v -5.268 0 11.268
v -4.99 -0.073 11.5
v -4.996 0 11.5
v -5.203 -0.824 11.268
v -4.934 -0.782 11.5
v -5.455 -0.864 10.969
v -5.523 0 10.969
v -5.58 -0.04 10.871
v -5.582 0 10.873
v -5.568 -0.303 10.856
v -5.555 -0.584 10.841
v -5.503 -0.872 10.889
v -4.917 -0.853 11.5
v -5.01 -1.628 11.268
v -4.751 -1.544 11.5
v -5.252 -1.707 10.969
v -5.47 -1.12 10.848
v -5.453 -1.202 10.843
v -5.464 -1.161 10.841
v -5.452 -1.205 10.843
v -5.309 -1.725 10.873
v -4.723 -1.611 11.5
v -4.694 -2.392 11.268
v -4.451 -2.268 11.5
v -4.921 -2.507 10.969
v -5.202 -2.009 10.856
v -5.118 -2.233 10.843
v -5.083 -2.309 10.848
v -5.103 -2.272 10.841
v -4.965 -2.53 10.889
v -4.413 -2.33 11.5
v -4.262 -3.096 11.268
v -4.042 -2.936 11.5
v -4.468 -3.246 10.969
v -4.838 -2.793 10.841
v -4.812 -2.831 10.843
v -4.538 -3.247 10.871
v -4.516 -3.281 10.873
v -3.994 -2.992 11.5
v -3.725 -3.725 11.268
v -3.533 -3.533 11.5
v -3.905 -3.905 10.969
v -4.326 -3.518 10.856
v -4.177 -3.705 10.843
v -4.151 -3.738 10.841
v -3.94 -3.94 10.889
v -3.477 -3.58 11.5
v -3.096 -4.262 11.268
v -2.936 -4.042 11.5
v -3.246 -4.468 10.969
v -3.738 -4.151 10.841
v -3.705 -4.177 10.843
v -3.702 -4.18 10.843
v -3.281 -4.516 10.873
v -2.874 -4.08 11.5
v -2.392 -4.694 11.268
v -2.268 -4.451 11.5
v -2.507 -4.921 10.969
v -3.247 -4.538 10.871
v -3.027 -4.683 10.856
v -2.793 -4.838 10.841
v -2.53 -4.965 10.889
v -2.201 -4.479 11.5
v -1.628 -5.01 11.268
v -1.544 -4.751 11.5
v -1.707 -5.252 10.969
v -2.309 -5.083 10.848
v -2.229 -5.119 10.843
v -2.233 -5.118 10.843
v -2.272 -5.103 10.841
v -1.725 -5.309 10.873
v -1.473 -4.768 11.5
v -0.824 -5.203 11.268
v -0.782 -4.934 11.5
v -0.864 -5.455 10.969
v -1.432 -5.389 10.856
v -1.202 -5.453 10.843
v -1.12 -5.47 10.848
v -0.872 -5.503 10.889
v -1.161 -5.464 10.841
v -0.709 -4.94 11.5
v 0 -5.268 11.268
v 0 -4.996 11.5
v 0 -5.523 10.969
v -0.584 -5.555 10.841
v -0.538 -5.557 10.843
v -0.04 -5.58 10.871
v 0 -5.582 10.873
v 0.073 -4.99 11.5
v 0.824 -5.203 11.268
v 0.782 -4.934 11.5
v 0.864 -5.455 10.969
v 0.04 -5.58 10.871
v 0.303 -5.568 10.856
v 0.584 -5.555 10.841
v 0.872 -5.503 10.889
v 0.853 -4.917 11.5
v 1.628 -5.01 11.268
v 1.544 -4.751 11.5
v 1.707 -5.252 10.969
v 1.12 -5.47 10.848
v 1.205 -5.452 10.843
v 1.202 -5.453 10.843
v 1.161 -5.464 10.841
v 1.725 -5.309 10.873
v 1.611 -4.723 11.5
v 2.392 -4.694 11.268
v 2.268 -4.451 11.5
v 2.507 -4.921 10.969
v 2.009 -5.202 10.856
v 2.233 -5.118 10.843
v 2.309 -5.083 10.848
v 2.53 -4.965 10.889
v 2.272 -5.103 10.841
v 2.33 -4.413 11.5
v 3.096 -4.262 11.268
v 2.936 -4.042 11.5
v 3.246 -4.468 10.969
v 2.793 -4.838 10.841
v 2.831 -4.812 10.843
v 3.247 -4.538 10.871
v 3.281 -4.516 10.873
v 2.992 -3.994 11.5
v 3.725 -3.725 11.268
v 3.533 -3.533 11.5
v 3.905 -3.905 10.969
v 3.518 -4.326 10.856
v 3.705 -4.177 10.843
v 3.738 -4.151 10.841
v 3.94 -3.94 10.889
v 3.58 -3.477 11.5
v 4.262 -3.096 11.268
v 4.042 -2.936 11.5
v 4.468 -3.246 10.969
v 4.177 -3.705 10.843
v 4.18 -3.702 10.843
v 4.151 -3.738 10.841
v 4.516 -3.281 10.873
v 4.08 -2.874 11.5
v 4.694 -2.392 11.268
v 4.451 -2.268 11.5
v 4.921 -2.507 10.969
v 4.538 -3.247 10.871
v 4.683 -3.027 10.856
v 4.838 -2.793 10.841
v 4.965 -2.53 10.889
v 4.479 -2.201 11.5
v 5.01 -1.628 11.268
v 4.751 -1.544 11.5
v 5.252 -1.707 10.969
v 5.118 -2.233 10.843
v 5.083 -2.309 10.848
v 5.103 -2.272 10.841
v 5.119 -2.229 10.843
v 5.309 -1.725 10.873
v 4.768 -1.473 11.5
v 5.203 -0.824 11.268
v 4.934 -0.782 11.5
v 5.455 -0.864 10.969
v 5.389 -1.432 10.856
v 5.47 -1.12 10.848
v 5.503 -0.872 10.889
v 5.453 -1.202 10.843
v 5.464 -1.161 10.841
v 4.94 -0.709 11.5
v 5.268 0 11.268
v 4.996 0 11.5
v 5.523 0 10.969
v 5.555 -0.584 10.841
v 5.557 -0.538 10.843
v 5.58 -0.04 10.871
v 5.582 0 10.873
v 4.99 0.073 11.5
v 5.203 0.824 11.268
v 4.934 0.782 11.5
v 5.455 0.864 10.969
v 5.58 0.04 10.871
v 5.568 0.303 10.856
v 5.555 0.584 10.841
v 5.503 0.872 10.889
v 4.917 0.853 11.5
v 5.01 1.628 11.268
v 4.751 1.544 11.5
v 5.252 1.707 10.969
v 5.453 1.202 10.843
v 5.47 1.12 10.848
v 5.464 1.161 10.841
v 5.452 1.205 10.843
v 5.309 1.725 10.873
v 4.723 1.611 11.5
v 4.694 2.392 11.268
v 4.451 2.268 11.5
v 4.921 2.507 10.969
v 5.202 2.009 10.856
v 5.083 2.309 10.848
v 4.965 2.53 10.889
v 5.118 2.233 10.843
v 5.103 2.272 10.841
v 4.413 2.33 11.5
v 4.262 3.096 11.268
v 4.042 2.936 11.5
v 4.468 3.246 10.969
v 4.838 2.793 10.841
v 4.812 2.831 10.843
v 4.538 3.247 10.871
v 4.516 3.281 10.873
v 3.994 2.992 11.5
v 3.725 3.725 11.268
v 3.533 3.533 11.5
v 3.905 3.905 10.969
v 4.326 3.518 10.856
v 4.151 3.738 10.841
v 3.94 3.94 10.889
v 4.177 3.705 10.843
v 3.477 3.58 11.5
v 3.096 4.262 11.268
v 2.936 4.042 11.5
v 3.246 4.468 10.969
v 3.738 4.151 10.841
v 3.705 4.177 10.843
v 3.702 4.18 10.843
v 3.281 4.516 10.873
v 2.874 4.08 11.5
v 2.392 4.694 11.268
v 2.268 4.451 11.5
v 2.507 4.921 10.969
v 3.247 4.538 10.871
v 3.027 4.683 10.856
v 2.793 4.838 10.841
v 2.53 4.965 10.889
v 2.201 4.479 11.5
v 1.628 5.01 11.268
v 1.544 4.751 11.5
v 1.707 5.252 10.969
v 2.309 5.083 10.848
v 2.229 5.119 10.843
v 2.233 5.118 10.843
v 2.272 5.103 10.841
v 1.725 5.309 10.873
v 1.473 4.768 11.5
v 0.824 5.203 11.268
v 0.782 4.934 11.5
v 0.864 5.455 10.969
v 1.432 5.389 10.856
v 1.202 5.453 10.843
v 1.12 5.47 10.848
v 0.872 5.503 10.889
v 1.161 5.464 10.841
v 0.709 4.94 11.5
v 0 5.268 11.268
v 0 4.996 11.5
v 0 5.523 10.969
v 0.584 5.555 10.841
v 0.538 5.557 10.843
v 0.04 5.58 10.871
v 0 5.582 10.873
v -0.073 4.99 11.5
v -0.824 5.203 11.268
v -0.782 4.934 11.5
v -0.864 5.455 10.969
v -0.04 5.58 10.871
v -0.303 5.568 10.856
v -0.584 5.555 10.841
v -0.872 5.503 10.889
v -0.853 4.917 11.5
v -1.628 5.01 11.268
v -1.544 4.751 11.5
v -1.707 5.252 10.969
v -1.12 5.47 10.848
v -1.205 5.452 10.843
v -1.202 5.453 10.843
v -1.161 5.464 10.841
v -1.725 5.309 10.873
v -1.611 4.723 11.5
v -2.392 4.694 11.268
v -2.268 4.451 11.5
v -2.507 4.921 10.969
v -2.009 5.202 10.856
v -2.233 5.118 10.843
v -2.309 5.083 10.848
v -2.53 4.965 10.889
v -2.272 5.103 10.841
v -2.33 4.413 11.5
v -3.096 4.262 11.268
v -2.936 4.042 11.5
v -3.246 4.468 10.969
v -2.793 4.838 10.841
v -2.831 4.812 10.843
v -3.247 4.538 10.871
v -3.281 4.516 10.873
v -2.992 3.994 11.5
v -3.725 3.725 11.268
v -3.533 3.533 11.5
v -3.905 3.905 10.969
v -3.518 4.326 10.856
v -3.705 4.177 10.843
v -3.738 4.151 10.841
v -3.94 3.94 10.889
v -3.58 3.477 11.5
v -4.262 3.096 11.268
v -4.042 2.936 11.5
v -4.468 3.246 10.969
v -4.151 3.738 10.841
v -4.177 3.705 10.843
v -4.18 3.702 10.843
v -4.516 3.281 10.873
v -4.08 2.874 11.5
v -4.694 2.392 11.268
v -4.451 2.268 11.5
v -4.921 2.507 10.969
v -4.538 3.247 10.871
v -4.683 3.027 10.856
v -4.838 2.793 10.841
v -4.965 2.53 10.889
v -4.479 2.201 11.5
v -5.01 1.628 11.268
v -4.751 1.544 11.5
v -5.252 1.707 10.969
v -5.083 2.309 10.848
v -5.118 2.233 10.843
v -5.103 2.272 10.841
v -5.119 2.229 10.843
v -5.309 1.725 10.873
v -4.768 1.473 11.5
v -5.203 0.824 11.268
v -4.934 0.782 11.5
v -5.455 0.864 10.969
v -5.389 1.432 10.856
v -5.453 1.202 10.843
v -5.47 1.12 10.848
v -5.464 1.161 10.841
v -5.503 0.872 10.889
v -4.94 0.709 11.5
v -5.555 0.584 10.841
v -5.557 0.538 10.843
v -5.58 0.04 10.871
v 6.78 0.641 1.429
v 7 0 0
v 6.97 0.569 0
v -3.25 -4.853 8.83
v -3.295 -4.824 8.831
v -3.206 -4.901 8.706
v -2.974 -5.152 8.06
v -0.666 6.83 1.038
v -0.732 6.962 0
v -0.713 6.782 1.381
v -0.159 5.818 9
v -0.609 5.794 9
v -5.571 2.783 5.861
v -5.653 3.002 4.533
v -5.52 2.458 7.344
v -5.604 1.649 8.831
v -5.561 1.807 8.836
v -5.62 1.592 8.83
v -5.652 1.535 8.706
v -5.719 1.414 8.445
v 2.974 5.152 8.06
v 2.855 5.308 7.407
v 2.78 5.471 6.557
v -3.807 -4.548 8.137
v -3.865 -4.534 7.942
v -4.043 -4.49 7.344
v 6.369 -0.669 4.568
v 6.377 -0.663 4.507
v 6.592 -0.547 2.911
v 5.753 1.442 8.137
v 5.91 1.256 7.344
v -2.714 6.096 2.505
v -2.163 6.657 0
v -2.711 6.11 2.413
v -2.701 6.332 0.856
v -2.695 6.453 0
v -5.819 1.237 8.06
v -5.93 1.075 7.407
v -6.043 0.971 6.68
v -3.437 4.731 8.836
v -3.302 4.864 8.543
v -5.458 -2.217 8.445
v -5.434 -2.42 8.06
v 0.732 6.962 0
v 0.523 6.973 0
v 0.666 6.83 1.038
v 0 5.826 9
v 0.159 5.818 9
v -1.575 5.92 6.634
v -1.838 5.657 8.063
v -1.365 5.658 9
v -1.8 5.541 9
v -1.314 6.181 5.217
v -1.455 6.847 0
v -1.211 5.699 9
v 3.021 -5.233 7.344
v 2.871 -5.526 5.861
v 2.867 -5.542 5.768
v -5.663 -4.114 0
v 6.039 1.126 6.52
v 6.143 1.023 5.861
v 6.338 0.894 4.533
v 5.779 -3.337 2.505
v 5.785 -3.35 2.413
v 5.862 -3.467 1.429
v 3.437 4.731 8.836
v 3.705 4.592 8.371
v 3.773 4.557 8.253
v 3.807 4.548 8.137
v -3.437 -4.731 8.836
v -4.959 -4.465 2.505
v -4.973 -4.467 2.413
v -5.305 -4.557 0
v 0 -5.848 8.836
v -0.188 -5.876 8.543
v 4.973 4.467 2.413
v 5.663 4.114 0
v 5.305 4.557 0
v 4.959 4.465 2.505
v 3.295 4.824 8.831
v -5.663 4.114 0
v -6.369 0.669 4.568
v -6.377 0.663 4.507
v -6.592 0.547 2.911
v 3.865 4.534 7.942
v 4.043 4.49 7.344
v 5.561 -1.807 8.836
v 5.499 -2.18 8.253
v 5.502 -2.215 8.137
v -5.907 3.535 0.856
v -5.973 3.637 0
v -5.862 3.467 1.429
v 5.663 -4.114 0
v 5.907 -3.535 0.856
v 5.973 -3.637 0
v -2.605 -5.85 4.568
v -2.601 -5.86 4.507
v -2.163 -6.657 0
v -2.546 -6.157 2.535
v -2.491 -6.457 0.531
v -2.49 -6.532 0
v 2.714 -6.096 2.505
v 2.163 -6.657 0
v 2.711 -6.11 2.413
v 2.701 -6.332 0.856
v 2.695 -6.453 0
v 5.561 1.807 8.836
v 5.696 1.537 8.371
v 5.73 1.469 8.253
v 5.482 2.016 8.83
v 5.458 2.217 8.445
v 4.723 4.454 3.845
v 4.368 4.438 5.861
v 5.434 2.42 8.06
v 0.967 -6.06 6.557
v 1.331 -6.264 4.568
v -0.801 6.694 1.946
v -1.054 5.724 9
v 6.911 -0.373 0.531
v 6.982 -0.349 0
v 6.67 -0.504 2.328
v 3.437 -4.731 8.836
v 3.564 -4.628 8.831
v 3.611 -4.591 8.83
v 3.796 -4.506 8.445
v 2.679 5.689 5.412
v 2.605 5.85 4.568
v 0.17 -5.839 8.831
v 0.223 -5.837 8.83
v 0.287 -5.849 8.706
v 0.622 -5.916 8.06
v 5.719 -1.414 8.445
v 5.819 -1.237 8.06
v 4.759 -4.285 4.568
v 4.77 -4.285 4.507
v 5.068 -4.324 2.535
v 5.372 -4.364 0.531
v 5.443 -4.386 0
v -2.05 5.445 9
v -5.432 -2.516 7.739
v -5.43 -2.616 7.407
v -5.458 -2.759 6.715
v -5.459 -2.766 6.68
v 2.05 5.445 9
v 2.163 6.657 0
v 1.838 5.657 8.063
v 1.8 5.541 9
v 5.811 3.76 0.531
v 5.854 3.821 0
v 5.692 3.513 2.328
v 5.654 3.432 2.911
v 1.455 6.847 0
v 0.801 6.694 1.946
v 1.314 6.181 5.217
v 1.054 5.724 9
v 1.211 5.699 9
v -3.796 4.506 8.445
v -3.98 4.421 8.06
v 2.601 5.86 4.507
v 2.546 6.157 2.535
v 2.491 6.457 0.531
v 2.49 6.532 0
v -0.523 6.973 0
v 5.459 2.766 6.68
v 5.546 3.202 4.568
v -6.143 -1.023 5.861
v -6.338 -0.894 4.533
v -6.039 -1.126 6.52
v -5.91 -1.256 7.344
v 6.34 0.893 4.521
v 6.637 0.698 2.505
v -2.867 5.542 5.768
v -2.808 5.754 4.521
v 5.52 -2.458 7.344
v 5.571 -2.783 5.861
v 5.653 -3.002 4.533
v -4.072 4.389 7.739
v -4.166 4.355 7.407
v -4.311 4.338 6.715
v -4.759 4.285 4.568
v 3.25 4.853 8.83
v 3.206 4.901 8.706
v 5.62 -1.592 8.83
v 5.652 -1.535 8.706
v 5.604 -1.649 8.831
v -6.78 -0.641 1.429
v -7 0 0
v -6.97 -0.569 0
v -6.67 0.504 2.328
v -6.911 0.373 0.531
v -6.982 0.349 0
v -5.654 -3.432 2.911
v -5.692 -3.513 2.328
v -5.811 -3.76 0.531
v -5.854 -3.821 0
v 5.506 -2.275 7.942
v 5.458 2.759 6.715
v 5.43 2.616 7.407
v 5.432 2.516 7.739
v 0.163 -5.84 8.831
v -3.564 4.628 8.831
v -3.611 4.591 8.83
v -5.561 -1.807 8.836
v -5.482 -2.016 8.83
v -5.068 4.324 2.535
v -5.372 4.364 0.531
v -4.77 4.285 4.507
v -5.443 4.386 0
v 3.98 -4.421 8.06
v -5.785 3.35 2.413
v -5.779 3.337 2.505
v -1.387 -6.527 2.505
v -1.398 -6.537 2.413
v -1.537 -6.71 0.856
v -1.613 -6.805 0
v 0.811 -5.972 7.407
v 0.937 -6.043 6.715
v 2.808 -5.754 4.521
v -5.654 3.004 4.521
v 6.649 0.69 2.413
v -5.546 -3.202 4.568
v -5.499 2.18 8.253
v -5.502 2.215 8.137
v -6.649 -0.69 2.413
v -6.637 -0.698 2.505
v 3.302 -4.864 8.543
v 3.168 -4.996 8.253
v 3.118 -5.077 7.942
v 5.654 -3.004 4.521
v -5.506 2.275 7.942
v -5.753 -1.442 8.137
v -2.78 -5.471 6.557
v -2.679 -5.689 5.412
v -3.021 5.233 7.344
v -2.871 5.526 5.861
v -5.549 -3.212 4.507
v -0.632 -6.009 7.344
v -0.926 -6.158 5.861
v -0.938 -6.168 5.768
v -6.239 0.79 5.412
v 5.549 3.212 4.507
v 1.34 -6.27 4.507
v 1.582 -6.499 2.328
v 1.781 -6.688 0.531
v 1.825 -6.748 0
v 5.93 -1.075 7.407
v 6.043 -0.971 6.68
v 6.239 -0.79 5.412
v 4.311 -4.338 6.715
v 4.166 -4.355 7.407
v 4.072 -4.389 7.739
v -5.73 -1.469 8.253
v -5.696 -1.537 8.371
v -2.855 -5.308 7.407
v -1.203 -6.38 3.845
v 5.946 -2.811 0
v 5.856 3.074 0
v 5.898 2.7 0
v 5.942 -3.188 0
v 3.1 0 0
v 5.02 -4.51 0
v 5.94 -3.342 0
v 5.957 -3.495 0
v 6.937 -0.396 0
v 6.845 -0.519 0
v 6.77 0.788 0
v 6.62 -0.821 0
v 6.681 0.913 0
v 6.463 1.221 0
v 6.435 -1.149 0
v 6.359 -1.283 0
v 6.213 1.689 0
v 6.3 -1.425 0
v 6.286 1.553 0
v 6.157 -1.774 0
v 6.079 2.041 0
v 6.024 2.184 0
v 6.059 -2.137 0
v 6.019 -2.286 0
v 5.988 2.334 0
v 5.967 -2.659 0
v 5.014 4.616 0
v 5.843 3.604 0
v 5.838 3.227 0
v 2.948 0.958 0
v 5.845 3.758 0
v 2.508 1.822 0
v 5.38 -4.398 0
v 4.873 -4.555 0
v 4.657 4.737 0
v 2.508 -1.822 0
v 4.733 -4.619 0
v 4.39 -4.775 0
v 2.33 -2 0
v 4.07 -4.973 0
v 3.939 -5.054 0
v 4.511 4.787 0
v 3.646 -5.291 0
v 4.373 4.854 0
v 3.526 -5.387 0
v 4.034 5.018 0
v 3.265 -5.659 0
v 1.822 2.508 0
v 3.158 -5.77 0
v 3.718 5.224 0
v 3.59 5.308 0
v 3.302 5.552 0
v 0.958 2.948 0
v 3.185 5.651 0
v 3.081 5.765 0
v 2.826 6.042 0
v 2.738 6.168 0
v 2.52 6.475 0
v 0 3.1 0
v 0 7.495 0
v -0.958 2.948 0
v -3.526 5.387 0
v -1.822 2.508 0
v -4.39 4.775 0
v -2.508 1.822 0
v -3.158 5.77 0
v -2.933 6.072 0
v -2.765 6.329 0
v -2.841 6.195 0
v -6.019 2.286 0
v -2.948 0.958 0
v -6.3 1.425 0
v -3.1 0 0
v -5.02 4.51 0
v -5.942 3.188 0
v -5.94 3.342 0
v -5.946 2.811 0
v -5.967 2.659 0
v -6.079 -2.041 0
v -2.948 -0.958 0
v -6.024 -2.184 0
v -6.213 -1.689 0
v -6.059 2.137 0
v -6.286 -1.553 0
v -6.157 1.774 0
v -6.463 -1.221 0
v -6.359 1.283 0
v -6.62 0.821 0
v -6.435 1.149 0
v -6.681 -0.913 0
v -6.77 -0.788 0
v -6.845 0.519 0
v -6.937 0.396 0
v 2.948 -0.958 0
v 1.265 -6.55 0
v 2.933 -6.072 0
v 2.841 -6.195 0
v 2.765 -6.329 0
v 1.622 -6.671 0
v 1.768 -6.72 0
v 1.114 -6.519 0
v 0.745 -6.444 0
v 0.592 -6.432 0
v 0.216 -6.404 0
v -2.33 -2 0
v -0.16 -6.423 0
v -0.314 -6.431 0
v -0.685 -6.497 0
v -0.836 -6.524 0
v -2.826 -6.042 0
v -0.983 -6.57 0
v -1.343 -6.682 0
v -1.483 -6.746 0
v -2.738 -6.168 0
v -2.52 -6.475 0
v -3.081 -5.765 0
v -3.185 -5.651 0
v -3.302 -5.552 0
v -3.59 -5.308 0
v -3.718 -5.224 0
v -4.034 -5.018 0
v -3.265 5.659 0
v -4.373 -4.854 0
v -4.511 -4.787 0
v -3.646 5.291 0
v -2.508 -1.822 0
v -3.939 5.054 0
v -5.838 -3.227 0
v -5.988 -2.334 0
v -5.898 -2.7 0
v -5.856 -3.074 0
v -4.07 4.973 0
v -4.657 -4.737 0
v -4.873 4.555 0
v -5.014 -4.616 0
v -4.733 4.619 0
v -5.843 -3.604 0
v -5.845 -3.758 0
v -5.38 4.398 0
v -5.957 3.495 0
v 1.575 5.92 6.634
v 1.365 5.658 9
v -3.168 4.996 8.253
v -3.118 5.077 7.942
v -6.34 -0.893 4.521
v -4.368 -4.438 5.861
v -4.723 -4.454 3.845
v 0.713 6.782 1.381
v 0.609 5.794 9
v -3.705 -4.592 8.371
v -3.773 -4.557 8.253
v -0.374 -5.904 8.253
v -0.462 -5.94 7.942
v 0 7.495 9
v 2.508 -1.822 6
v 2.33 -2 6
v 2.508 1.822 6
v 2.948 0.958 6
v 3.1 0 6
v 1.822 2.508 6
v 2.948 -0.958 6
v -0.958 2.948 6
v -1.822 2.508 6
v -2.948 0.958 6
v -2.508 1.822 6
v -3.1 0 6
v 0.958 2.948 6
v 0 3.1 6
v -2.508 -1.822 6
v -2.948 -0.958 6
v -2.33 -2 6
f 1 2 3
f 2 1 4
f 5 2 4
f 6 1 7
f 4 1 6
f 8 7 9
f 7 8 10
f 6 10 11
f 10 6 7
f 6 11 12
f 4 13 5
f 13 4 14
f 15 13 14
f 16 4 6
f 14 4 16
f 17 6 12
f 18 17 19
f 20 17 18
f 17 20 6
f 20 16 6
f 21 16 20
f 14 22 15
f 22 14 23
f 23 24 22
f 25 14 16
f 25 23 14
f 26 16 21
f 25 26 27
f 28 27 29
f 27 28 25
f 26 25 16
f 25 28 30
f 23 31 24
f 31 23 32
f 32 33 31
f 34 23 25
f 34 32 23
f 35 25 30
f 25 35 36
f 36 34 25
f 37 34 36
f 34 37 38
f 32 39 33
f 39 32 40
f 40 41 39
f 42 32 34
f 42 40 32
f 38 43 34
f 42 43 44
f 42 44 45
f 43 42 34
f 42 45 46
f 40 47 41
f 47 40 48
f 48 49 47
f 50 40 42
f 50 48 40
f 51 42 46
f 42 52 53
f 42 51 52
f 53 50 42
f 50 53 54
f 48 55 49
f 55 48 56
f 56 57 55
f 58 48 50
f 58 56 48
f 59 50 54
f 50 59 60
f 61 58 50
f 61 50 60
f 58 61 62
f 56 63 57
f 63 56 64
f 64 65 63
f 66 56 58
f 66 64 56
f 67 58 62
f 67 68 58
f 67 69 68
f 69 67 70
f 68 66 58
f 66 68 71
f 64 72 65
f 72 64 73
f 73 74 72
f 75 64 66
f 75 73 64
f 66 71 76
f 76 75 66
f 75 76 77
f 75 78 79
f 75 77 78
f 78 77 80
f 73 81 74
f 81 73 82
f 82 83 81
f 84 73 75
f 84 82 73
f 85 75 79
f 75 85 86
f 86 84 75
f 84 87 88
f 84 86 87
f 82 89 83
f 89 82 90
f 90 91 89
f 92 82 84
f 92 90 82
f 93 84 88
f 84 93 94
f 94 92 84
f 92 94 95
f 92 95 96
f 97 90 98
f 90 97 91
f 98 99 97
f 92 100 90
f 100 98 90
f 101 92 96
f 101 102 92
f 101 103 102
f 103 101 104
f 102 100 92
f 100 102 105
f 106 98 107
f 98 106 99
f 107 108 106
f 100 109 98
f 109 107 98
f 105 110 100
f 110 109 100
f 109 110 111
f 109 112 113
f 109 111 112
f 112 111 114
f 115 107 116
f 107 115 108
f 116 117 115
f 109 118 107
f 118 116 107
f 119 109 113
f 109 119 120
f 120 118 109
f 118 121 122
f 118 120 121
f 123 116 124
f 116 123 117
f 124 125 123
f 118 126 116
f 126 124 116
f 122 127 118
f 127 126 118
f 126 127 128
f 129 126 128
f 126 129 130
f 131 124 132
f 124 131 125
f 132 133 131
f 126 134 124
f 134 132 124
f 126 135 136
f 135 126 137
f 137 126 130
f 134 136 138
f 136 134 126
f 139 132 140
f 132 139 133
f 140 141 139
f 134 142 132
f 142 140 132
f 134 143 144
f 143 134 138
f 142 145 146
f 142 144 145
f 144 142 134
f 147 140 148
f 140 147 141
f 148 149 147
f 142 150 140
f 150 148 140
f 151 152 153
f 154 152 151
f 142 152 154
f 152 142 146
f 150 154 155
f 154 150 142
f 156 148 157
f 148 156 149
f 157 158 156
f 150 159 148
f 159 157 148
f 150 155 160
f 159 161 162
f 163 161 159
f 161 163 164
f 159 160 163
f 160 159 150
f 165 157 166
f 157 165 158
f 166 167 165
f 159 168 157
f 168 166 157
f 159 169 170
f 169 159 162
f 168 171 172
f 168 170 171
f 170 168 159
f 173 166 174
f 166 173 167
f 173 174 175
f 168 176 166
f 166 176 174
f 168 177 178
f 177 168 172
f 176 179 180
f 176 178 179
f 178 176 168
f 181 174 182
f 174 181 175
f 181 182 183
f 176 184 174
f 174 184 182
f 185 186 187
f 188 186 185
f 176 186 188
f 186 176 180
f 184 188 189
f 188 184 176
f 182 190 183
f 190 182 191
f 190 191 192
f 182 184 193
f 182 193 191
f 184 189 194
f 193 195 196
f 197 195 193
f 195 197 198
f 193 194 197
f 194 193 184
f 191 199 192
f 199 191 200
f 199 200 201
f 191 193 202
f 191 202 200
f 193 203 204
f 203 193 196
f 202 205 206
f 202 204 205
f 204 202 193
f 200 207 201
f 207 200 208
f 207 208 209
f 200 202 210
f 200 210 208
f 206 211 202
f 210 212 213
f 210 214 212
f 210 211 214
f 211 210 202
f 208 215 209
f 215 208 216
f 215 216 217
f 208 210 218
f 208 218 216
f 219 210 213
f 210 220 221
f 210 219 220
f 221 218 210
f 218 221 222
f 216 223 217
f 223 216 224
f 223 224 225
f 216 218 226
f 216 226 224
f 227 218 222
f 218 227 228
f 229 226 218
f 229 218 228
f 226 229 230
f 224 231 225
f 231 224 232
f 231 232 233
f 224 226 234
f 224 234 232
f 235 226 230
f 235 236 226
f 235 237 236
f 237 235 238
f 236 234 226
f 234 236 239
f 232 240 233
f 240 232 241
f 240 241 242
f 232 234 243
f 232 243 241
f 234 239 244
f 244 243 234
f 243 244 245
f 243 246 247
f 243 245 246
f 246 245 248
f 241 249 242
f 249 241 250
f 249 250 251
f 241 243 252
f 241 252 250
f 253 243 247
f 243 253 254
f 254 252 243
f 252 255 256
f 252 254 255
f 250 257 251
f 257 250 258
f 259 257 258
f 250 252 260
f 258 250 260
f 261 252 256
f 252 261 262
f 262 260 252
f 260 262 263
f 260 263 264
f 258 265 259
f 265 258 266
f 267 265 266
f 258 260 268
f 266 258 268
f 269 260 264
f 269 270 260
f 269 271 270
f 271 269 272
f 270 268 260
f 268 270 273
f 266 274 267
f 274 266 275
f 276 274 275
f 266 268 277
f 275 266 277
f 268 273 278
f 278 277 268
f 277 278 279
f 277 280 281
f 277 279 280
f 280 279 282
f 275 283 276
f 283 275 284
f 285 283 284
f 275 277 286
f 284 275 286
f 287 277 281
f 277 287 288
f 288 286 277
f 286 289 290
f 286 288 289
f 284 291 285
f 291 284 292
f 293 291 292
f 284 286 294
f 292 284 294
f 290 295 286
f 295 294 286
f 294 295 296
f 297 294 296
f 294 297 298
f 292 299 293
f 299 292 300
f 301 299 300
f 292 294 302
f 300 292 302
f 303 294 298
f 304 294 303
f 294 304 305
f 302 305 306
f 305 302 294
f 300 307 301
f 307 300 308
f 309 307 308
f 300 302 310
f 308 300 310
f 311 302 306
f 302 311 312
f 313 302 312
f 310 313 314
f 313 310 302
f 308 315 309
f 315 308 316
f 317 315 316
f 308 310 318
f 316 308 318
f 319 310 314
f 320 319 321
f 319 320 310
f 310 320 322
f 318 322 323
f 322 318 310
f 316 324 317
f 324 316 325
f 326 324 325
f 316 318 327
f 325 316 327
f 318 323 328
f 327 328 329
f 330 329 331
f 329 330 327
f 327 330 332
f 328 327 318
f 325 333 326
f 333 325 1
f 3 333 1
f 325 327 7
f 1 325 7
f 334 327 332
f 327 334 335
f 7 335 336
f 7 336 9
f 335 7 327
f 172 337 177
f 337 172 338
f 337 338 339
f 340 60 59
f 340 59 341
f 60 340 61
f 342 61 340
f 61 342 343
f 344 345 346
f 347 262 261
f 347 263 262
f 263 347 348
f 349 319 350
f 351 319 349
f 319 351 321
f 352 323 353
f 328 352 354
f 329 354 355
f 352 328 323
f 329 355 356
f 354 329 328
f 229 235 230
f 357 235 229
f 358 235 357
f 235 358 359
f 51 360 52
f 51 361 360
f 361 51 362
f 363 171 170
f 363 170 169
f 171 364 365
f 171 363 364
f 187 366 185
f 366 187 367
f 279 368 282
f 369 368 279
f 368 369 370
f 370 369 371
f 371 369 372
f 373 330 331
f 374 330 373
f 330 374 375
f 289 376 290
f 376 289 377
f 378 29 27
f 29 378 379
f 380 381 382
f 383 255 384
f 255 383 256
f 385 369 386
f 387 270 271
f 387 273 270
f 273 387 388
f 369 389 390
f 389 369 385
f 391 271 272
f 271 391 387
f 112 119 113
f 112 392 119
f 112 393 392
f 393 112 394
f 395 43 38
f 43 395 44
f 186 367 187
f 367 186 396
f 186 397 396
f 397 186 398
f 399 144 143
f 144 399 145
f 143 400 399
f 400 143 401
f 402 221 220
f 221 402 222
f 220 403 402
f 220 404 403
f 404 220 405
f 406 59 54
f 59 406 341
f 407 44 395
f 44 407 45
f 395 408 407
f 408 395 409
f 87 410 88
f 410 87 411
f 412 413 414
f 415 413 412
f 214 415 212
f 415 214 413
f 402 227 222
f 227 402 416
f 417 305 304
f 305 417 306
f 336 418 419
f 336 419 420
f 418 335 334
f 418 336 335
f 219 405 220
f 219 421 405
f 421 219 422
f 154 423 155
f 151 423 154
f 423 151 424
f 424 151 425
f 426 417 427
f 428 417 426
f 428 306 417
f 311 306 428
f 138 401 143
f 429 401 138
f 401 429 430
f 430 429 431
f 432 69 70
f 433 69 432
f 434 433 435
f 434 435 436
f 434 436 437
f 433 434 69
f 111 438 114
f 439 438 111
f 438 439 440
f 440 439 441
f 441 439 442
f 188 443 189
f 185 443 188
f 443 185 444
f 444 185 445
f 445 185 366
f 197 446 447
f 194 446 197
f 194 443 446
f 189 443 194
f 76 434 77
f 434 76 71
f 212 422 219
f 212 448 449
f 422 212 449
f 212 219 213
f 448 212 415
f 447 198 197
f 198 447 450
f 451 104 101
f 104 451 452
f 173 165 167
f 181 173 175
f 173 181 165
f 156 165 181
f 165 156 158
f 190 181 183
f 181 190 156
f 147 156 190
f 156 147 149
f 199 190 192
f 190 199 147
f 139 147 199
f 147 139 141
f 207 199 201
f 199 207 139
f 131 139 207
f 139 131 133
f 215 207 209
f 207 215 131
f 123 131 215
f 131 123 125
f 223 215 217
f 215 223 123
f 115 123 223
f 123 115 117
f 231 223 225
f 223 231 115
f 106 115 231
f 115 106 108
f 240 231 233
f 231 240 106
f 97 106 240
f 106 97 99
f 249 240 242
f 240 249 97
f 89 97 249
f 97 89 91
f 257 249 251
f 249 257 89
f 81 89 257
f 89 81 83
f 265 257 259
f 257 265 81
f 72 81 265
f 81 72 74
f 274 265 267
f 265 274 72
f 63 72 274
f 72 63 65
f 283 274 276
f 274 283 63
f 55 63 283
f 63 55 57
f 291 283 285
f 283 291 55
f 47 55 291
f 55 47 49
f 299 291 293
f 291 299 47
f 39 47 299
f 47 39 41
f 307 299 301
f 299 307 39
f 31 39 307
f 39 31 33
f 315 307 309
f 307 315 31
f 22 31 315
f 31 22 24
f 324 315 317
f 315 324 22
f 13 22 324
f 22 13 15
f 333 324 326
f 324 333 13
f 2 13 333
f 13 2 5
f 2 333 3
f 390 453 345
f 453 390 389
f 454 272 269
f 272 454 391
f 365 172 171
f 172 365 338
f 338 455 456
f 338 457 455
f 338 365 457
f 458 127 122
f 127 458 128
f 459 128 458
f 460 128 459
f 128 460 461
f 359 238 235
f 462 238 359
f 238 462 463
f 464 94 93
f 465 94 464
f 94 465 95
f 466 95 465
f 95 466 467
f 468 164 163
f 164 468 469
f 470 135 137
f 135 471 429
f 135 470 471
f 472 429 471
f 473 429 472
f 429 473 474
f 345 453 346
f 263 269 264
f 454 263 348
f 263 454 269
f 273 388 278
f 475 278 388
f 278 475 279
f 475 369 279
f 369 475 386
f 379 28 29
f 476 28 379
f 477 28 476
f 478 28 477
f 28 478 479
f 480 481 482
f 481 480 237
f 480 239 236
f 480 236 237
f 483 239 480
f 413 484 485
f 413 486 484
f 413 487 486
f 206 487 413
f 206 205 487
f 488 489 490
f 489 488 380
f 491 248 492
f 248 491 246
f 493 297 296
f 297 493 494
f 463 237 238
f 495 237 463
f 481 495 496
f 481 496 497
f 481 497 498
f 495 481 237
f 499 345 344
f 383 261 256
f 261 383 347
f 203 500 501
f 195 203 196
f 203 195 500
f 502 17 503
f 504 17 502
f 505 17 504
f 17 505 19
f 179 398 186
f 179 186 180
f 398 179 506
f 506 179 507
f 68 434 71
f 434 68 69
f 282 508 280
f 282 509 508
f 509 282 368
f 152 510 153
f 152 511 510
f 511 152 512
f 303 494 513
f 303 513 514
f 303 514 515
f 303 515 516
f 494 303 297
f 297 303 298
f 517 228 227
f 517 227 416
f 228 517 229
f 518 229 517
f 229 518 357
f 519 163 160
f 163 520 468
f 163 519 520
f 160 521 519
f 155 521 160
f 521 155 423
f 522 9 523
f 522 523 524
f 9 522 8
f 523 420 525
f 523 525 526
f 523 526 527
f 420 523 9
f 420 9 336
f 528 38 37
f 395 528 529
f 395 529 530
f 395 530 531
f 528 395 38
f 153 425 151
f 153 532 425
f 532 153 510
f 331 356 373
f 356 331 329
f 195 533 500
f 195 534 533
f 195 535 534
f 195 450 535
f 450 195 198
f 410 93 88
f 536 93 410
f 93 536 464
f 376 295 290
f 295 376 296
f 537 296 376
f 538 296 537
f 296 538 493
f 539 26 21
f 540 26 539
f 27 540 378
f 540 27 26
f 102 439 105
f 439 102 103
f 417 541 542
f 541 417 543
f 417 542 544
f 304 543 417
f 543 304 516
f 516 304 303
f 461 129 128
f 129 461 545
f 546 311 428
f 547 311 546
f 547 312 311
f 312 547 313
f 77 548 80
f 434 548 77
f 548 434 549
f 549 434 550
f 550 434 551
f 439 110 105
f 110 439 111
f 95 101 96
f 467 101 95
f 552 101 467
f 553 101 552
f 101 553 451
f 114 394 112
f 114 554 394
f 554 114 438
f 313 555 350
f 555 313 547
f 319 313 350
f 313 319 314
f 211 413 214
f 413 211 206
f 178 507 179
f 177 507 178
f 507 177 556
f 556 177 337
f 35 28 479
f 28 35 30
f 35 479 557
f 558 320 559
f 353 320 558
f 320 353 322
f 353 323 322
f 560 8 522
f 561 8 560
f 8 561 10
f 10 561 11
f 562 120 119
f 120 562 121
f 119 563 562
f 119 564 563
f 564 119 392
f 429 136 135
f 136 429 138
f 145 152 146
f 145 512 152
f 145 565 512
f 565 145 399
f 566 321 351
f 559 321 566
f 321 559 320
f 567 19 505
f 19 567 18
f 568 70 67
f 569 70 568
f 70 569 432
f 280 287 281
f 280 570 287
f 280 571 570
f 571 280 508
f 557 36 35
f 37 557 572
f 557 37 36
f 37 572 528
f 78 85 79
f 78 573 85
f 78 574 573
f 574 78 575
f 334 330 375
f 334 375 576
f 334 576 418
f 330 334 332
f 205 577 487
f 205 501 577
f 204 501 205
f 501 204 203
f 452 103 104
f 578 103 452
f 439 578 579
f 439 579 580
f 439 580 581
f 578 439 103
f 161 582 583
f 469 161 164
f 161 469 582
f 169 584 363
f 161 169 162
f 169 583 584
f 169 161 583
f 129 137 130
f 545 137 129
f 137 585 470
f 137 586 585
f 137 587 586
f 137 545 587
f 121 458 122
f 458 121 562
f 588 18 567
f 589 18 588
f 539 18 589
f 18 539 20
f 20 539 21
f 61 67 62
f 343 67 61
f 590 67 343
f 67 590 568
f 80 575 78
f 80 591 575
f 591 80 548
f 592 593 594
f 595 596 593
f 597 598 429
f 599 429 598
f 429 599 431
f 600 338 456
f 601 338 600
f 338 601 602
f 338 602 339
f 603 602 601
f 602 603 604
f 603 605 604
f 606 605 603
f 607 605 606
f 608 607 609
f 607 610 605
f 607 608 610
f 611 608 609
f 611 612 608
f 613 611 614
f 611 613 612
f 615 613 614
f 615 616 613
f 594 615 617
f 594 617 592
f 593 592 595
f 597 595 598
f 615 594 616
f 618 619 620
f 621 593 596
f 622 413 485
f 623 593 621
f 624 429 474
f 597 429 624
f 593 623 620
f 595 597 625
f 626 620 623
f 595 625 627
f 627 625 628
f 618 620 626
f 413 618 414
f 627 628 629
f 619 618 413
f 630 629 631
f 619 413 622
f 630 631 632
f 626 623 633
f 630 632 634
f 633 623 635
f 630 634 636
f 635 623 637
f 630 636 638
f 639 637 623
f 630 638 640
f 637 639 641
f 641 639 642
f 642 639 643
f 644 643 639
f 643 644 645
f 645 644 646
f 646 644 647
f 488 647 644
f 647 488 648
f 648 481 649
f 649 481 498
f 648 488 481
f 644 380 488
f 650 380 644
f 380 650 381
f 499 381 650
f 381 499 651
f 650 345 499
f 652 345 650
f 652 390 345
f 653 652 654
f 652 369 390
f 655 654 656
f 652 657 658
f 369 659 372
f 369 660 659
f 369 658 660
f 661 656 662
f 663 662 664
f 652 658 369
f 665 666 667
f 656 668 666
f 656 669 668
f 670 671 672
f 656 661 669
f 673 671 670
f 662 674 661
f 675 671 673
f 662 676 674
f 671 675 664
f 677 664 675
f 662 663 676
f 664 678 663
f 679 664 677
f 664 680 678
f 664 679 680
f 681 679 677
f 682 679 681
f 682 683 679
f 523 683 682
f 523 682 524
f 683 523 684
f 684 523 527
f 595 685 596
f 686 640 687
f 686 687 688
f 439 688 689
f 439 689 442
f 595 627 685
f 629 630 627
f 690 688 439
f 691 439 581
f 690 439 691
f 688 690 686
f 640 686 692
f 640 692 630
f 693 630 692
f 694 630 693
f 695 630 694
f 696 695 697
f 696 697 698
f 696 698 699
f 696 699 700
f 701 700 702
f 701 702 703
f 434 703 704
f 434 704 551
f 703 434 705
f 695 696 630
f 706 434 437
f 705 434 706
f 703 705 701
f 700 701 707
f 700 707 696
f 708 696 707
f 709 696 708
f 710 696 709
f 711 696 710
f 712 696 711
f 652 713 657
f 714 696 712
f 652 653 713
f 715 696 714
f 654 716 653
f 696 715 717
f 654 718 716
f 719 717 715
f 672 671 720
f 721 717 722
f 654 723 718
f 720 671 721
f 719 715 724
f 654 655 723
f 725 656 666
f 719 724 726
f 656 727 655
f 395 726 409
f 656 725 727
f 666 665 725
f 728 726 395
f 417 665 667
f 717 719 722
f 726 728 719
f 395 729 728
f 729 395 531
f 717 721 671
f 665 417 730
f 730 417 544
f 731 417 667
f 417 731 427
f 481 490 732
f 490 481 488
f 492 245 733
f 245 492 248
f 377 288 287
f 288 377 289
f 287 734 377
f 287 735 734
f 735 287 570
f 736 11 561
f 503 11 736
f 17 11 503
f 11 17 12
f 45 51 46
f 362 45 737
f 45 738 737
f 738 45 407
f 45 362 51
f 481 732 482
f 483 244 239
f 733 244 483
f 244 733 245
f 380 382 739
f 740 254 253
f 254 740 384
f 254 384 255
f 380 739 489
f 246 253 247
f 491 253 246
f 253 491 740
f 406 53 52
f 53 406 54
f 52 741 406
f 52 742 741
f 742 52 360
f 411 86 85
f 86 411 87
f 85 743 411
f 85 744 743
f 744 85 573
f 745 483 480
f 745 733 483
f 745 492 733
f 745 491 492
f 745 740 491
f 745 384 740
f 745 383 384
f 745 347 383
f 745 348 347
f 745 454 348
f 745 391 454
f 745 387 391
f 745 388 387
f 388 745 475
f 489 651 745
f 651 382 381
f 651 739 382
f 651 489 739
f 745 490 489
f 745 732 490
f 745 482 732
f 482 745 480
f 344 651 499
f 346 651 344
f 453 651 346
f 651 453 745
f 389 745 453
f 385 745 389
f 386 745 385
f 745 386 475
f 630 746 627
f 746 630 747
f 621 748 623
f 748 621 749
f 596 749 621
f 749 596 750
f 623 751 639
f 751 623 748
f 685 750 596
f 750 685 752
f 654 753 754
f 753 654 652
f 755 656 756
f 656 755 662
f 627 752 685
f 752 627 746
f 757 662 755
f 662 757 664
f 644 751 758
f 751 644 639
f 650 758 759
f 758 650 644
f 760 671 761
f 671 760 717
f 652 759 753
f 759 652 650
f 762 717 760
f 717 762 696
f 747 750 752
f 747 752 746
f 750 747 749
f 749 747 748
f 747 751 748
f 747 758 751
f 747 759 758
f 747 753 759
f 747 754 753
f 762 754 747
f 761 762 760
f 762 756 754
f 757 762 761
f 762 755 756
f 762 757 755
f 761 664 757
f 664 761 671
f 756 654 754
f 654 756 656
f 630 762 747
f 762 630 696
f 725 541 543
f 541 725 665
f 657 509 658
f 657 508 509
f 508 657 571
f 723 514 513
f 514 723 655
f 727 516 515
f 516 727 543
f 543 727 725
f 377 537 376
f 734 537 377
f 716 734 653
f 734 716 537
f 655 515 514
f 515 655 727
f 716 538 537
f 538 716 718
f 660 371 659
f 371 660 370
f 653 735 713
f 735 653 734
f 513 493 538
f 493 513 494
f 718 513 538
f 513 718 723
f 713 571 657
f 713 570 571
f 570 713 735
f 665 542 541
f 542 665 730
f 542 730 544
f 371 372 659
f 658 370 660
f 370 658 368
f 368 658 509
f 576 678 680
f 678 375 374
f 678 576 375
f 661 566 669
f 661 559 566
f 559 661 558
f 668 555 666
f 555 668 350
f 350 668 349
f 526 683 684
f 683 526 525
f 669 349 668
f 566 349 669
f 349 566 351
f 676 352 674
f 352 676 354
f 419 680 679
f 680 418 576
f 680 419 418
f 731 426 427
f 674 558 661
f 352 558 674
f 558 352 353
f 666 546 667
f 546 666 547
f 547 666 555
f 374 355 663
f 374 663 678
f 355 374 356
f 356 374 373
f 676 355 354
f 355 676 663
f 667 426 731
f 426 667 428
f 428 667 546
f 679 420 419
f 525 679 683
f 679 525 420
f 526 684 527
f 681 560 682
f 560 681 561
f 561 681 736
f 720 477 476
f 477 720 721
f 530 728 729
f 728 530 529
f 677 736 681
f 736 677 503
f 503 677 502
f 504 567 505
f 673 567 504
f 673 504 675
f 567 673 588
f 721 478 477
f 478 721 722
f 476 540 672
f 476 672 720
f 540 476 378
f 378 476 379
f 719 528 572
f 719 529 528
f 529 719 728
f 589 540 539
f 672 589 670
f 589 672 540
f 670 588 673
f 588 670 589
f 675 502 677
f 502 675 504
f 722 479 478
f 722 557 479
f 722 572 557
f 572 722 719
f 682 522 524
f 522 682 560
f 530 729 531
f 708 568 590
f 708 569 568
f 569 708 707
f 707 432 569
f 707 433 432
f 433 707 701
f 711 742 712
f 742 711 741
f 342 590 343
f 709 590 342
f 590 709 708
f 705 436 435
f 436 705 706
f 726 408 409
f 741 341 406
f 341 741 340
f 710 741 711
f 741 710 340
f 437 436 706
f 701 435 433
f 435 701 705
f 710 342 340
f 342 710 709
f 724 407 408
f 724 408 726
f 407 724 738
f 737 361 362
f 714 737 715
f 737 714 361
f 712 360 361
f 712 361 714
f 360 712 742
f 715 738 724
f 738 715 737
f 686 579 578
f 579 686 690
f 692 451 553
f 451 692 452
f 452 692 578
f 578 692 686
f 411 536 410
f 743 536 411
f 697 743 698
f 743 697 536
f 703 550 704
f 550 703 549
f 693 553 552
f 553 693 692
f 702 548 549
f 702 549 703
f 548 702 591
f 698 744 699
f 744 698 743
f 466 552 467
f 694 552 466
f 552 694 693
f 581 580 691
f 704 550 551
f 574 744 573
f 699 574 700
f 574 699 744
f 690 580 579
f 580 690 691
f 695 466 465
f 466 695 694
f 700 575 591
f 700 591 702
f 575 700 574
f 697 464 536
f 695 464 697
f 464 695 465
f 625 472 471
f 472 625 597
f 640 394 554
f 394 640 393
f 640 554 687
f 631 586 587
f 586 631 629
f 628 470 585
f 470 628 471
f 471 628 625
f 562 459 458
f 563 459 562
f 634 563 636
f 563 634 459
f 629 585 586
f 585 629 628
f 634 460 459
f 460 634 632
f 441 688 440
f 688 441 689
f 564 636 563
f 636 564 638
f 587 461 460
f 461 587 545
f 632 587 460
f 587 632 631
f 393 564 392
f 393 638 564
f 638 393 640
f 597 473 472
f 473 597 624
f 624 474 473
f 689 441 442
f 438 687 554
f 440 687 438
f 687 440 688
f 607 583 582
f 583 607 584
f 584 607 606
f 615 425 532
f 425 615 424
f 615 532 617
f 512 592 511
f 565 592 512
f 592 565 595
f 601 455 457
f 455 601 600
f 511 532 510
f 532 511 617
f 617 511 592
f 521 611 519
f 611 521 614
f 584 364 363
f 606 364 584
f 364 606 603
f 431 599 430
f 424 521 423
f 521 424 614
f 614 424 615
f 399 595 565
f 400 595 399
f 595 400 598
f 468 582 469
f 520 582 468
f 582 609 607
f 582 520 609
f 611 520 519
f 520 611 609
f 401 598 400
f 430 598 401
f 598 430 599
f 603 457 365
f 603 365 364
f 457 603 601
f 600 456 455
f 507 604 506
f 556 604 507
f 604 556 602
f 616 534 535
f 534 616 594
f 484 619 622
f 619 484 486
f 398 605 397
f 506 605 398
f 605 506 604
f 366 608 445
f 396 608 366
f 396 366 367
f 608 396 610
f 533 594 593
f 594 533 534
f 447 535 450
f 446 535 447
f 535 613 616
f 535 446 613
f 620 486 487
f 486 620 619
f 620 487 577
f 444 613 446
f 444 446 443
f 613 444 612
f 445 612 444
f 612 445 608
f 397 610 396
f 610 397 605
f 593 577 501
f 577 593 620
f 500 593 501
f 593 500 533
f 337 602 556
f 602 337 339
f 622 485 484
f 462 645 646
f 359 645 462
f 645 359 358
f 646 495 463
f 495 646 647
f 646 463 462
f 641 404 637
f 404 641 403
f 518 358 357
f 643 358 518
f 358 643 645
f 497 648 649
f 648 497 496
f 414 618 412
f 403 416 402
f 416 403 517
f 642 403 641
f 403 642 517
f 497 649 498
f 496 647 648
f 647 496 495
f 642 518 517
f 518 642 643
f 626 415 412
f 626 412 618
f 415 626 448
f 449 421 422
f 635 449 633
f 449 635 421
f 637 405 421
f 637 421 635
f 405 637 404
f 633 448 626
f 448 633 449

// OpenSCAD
/*

Parametric Potentiometer Knob Generator
version 1.1
2012 Steve Cooley
http://sc-fa.com
http://beatseqr.com
http://hapticsynapses.com

parametric potentiometer knob generator by steve cooley is licensed under a Creative Commons Attribution-NonCommercial-ShareAlike 3.0 Unported License. Based on a work at sc-fa.com. Permissions beyond the scope of this license may be available at http://sc-fa.com/blog/contact.

view terms of the license here:
http://creativecommons.org/licenses/by-nc-sa/3.0/


version history
---------------
1.1 2012-04-12 fixed the arrow indicator code to be more robust and easier to adjust parameters for.
1.0 2012-03-?? initial release.


*/


//
//
// Physical attributes, basic
//
//

knob_radius_top = 5.5;
knob_radius_bottom = 7;
knob_height = 11.5;
knob_smoothness = 60;

shaft_radius = 3.1;
shaft_height = 7;
shaft_smoothness = 20;

shaft_is_flatted = true;
flat_size_adjustment = 0.5;
// you won't need to mess with this. less than 5 makes it disappear. you can, however,
// set the adjustment to be a negative decimal if you need a flat but not as big as the default.
// go positive if you need a bigger flat
flat_size = 5 + flat_size_adjustment;

// some potentiometers need to have their knobs affixed with a set screw.
set_screw = false;
set_screw_radius = 1.5;
set_screw_depth = 9;
set_screw_height = 4;
quality_of_set_screw = 20;

//
//
// Decorations
//
//

//
// top edge smoothing
// thanks to http://www.iheartrobotics.com/ for the articles!
//

smoothing = true;
smoothing_radius = 2.5;				// tweak on this one, how much smoothing to apply
smooth = 40;						// tweak on this one, Number of facets of rounding cylinder

ct = -0.5; 							// circle translate? not sure.
circle_radius = knob_radius_top;  	// just match the top edge radius
circle_height = 1; 					// actually.. I don't know what this does.
pad = 0.2;							// Padding to maintain manifold


//
// directional indicators
//

// this is a corner edge of a cube sticking out of the cylinder at the bottom
// you can use it instead of the arrow shaped cutout in the top if you like. Or both.

pointy_external_indicator = true;
pointy_external_indicator_height = 9;
pointy_external_indicator_pokey_outey_ness = -0.5; //
pokey_outey_value = pointy_external_indicator_pokey_outey_ness - 1 - pad;
pokey_outey = [pokey_outey_value, pokey_outey_value,0];

// there's an arrow shaped hole you can have. There aren't a lot of controls for this.
// please feel free to improve on this script here.

arrow_indicator = false;
arrow_indicator_scale = 0.4;
arrow_indicator_translate = [0,1,16];
arrow_scale_head = 2;
arrow_scale_shaft = 1.5;

//
// indentations
//

// for spherical indentations, set the quantity, quality, size, and adjust the placement
indentations_sphere = false;
sphere_number_of_indentations = 10;
sphere_quality_of_indentations = 10;
size_of_sphere_indentations = 3;
// the first number in this set moves the spheres in or out. smaller is closer to the middle
// the second number in this set moves the spheres left or right
// the third number in this set moves the speheres up or down
translation_of_sphere_indentations = [8,0,15];
// in case you are using an odd number of indentations, you way want to adjust the starting angle
// so that they align to the front or set screw locations.
sphere_starting_rotation = 90;

// for cylinder indentations, set quantity, quality, radius, height, and placement
indentations_cylinder = true;
cylinder_number_of_indentations = 10;
cylinder_quality_of_indentations = 50;
radius_of_cylinder_indentations_top = 4.9;
radius_of_cylinder_indentations_bottom = 4;
height_of_cylinder_indentations = 14;
translation_of_cylinder_indentations = [0,8,-8];
cylinder_starting_rotation = -40.3;

// these are some setup variables... you probably won't need to mess with them.
negative_knob_radius = knob_radius_bottom*-1;


// this is the main module. It calls the submodules.
make_the_knob();

module make_the_knob()
{
	difference()
		{
		difference()
			{

			difference()
				{
				difference()
					{

					union()
						{

						difference()
							{
							// main cylinder
							cylinder(r1=knob_radius_bottom,r2=knob_radius_top,h=knob_height, $fn=knob_smoothness);

							smoothing();

							}

						external_direction_indicator();
						}

					shaft_hole();
					}

				set_screw_hole();
				}

			arrow_indicator();
			indentations();
		}
	}

}

module smoothing() {

// smoothing the top
				if(smoothing == true)
					{
						translate([0,0,knob_height])
						rotate([180,0,0])
						difference() {
							rotate_extrude(convexity=10,  $fn = smooth)
							translate([circle_radius-ct-smoothing_radius+pad,ct-pad,0])
							square(smoothing_radius+pad,smoothing_radius+pad);

							rotate_extrude(convexity=10,  $fn = smooth)
							translate([circle_radius-ct-smoothing_radius,ct+smoothing_radius,0])
							circle(r=smoothing_radius,$fn=smooth);
							}
					}
}

module external_direction_indicator() {

				if(pointy_external_indicator == true)
						{


						// outer pointy indicator
						rotate([0,0,45])
						translate(pokey_outey)
						// cube size of 8 minimum to point out
						cube(size=[knob_radius_bottom,knob_radius_bottom,pointy_external_indicator_height],center=false);
						}

}

module shaft_hole() {
				// shaft hole
				difference()
					{

					// round shaft hole
					translate([ 0, 0, -1 ])
					cylinder(r=shaft_radius,h=shaft_height, $fn=shaft_smoothness);

					if(shaft_is_flatted == true)
						{
						// D shaft shape for shaft cutout
						rotate( [0,0,90])
						translate([-7.5,-5,0])
						cube(size=[flat_size,10,13],center=false);
						}
					}
}


module set_screw_hole() {

			if(set_screw == true)
				{
				// set screw hole
				rotate ([90,0,0])
				translate([ 0, set_screw_height, 1 ])
				cylinder(r=set_screw_radius,h=set_screw_depth, $fn=quality_of_set_screw);
				}
}

module arrow_indicator() {
		if(arrow_indicator == true)
			{
			translate(arrow_indicator_translate)
			// begin arrow top cutout
			// translate([(knob_radius/2),knob_height,knob_height])
			rotate([90,0,45])
			scale([arrow_indicator_scale*.3,arrow_indicator_scale*.3,arrow_indicator_scale*.3])
			union()
				{
				rotate([90,45,0])
				scale([arrow_scale_head,arrow_scale_head,1])
				cylinder(r=8, h=10, $fn=3, center=true);
				rotate([90,45,0])
				translate([-10,0,0])
				scale([arrow_scale_shaft,arrow_scale_shaft,1])
				cube(size=[15,10,10],center=true);
				}
			}
}

module indentations() {

if(indentations_sphere == true)
			{
			for (z = [0:sphere_number_of_indentations])
				{
				rotate([0,0,sphere_starting_rotation+((360/sphere_number_of_indentations)*z)])
				translate(translation_of_sphere_indentations)
				sphere(size_of_sphere_indentations, $fn=sphere_quality_of_indentations);
				}
			}
if(indentations_cylinder == true)
			{
                start = (pointy_external_indicator) ? 1 : 0;
                end = (pointy_external_indicator) ? cylinder_number_of_indentations - 1 : cylinder_number_of_indentations;
			for (z = [start:end])
				{
				rotate([0,0,cylinder_starting_rotation+((360/cylinder_number_of_indentations)*z)])

				translate([negative_knob_radius,0,knob_height])
				translate(translation_of_cylinder_indentations)
				cylinder(r1=radius_of_cylinder_indentations_bottom, r2=radius_of_cylinder_indentations_top, h=height_of_cylinder_indentations, center=true, $fn=cylinder_quality_of_indentations);
				}
			}
		}
